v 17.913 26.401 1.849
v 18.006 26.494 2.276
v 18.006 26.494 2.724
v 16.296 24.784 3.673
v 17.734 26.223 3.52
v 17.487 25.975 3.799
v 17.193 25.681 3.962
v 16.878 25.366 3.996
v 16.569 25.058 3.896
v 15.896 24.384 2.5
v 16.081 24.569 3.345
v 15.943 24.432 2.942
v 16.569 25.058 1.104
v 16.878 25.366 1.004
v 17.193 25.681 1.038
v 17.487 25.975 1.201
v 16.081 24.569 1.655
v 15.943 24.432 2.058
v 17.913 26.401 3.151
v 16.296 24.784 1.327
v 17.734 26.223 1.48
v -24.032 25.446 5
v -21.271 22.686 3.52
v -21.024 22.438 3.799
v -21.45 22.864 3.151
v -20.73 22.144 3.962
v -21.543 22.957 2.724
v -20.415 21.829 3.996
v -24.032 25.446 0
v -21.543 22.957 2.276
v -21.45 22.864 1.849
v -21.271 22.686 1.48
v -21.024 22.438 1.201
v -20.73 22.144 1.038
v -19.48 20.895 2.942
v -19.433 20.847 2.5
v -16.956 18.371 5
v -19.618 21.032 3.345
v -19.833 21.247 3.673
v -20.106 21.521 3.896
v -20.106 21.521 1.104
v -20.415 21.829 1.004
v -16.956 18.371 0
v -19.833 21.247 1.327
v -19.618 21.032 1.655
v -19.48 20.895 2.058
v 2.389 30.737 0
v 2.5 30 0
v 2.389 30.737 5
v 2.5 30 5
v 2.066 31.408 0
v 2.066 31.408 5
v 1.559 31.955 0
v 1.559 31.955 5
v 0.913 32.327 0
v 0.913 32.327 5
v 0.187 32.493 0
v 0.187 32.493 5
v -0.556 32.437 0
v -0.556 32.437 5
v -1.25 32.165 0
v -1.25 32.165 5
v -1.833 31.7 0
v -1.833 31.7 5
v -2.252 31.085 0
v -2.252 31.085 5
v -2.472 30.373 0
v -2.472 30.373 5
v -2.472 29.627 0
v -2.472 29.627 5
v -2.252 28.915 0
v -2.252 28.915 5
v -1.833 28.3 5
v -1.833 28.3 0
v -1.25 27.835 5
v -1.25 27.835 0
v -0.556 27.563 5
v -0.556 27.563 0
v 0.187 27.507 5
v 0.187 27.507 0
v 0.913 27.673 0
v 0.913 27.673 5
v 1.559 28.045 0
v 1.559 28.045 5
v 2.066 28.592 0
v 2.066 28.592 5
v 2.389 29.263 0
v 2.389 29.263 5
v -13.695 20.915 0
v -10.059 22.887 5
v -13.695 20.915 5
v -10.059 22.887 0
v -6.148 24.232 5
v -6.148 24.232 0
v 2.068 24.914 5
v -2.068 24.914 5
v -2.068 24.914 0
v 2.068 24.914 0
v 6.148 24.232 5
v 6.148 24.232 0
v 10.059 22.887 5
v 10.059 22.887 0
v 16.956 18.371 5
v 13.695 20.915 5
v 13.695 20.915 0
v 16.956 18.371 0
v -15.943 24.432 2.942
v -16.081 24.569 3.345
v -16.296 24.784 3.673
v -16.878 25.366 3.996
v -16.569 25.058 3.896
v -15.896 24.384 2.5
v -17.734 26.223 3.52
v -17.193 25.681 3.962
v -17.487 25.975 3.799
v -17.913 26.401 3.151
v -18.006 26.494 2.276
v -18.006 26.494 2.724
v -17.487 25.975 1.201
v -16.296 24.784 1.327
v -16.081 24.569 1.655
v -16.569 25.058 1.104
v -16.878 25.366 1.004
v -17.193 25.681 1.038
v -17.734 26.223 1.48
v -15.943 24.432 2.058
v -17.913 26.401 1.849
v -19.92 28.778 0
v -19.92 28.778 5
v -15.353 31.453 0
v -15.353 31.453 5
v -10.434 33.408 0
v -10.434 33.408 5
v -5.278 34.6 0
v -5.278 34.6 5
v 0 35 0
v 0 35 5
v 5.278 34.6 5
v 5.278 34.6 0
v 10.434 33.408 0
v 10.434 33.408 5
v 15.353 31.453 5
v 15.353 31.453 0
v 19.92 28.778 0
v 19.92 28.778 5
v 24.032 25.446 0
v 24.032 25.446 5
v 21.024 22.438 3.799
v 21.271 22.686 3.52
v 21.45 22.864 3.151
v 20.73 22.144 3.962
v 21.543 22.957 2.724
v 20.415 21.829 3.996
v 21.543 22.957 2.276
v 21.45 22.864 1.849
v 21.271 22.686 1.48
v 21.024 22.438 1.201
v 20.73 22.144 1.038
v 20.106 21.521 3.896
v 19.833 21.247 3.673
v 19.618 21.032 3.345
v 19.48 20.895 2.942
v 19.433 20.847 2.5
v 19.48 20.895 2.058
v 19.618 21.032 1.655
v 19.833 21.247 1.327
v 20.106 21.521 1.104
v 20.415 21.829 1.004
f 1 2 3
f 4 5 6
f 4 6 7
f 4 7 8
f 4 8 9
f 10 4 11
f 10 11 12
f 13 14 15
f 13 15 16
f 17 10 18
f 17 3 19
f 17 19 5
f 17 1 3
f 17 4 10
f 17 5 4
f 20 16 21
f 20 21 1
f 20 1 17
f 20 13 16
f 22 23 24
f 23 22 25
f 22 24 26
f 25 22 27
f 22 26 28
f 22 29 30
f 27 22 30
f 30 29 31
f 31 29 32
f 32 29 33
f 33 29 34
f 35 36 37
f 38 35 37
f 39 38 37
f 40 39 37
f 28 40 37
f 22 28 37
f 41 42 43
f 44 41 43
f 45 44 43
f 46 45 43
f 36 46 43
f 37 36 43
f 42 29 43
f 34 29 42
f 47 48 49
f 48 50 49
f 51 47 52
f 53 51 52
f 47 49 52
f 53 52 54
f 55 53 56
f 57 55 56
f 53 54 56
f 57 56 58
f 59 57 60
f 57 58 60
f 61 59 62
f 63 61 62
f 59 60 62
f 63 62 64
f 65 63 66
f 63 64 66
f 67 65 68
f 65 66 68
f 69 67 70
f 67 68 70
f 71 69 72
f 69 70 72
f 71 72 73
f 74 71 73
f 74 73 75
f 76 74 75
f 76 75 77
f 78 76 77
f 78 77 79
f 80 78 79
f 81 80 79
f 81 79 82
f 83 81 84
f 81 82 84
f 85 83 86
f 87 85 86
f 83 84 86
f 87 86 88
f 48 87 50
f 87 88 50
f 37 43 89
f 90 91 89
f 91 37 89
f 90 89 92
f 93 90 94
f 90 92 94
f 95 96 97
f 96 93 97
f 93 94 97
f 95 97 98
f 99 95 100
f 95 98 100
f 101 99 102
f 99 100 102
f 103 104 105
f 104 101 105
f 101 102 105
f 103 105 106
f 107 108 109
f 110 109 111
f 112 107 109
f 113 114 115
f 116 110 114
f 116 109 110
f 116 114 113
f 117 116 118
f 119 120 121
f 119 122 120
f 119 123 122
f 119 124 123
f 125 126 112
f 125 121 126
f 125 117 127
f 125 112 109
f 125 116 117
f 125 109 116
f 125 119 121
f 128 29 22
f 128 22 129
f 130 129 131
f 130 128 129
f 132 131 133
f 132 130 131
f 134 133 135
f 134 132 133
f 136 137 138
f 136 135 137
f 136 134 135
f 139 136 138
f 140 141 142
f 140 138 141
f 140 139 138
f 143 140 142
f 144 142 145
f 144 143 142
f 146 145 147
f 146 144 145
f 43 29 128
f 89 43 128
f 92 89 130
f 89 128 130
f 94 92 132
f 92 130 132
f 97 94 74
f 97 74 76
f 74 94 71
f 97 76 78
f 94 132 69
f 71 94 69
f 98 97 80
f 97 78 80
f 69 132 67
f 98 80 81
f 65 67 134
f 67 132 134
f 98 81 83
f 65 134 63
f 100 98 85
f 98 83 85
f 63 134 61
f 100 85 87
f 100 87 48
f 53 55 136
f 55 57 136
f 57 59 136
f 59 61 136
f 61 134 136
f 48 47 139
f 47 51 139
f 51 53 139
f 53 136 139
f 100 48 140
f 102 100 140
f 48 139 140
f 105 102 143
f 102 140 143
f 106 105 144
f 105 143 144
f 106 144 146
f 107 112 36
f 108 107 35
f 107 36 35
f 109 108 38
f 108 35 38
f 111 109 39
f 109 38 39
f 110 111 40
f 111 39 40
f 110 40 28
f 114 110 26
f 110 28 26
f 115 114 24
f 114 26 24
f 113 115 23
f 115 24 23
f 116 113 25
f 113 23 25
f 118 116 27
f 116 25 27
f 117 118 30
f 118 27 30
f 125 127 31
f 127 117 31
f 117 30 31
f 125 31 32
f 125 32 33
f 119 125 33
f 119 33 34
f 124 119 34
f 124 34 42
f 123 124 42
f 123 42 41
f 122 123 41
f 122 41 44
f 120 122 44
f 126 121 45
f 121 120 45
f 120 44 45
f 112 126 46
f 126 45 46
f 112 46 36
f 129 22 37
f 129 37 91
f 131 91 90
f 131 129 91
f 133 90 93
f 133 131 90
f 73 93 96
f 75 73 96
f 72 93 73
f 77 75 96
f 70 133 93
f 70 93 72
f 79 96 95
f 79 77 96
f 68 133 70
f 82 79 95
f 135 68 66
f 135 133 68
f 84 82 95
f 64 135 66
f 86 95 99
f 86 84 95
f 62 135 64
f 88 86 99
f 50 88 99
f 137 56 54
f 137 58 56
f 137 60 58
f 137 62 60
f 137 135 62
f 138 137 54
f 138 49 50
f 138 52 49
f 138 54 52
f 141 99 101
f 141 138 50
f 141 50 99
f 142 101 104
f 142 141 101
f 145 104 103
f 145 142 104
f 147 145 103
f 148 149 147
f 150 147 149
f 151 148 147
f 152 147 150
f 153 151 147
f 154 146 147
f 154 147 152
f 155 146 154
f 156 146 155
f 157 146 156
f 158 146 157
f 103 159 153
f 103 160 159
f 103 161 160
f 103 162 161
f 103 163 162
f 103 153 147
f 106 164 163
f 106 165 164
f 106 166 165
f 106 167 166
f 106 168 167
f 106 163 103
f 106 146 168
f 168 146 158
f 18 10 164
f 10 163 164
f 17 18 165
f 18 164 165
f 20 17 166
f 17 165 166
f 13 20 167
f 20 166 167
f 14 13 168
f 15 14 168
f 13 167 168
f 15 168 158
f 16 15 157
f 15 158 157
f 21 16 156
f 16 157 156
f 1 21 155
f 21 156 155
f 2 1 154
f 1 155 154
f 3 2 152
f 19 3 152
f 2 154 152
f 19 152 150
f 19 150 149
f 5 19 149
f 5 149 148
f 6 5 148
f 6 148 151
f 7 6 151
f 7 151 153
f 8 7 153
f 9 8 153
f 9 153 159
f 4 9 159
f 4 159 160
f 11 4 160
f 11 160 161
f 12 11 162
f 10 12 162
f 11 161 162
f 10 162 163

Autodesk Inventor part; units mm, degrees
ref_plane "YZ Plane" through (0, 0, 0) normal (1, 0, 0) x (0, 1, 0)
ref_plane "XZ Plane" through (0, 0, 0) normal (0, 1, 0) x (-1, 0, 0)
ref_plane "XY Plane" through (0, 0, 0) normal (0, 0, 1) x (1, 0, 0)
sketch "Sketch1" plane through (0, 0, 0) normal (0, 0, 1) x (1, 0, 0)
  circle A0 centre (0, 0) radius 25
  circle A1 centre (0, 0) radius 35
  line L0 (-17.6777, 17.6777) -> (-24.7487, 24.7487)
  line L1 (0, 35) -> (0, 0) construction
  line L2 (-24.0315, 25.4457) -> (-16.9564, 18.3706)
  line L3 (-1.1667, 34.9806) -> (-1.1667, 34.9972)
  line L4 (1.1667, 34.9806) -> (1.1667, 34.9972)
  line L5 (17.6777, 17.6777) -> (24.7487, 24.7487)
  line L6 (24.0315, 25.4457) -> (16.9564, 18.3706)
  line L7 (-25.4457, 24.0315) -> (-18.3706, 16.9564)
  line L8 (25.4457, 24.0315) -> (18.3706, 16.9564)
  line L9 (-1, 15) -> (1, 15)
  line L10 (1, 15) -> (1, 0)
  line L11 (1, 0) -> (-1, 0)
  line L12 (-1, 0) -> (-1, 15)
  line L13 (-1, 0) -> (1, 0)
  line L14 (1, 0) -> (1, -6)
  line L15 (1, -6) -> (-1, -6)
  line L16 (-1, -6) -> (-1, 0)
  line L17 (-1, -6) -> (-5, -6)
  line L18 (-5, -6) -> (-5, 3)
  line L19 (-5, 3) -> (-1, 3)
  line L20 (-1, 3) -> (-1, -6)
  line L21 (-5, 3) -> (-21.2192, -13.2192)
  line L22 (-5, -6) -> (-17.1706, -18.1706)
  line L23 (-5, 3) -> (-1, 15)
  line L24 (-5, -6) -> (-1, -2)
  line L25 (1, 0) -> (1, 15)
  line L26 (1, -6) -> (1, 0)
  line L27 (5, 3) -> (21.2192, -13.2192)
  line L28 (5, -6) -> (17.1706, -18.1706)
  line L29 (5, 3) -> (1, 15)
  line L30 (5, -6) -> (1, -2)
  point P0 (-20.5061, 21.9203)
  point P1 (-21.9203, 20.5061)
  point P2 (20.5061, 21.9203)
  point P3 (21.9203, 20.5061)
  point P4 (-1, -2)
  point P5 (1, 0)
  point P6 (1, -2)
  dimension "d0" = 50
  dimension "d1" = 10
  dimension "d2" = 45
  dimension "d3" = 1
  dimension "d5" = 2
  dimension "d6" = 15
  dimension "d7" = 6
  dimension "d8" = 2
  dimension "d9" = 4
  dimension "d11" = 45
  dimension "d12" = 45
  dimension "d13" = 3
  dimension "d14" = 45
extrude "Extrusion1" add sketch "Sketch1" along normal blind 5 contours A0 L2 A1 L6
sketch "Sketch3" plane through (24.0315, 25.4457, 5) normal (0.7071, -0.7071, 0) x (-0.7071, -0.7071, 0)
  line L0 (0, 5) -> (0, 0) construction
  line L1 (10.0057, 0) -> (0, 0) construction
  circle A0 centre (5.0029, 2.5) radius 1.5
  point P0 (34.9857, 5)
  dimension "d19" = 3
  dimension "d21" = 5.0029
  dimension "d22" = 2.5
extrude "Extrusion3" cut sketch "Sketch3" against normal blind 5
sketch "Sketch4" plane through (0, 0, 5) normal (0, 0, 1) x (1, 0, 0)
  arc A0 (24.0315, 25.4457) -> (-24.0315, 25.4457) centre (0, 0) ccw construction
  circle A1 centre (0, 30) radius 2.5
  point P0 (0, 35)
  dimension "d25" = 5
  dimension "d26" = 5
extrude "Extrusion4" cut sketch "Sketch4" against normal through all
mirror "Mirror1" about plane through (0, 0, 0) normal (1, 0, 0) of "Extrusion3"
properties part number "Black_Part1"
